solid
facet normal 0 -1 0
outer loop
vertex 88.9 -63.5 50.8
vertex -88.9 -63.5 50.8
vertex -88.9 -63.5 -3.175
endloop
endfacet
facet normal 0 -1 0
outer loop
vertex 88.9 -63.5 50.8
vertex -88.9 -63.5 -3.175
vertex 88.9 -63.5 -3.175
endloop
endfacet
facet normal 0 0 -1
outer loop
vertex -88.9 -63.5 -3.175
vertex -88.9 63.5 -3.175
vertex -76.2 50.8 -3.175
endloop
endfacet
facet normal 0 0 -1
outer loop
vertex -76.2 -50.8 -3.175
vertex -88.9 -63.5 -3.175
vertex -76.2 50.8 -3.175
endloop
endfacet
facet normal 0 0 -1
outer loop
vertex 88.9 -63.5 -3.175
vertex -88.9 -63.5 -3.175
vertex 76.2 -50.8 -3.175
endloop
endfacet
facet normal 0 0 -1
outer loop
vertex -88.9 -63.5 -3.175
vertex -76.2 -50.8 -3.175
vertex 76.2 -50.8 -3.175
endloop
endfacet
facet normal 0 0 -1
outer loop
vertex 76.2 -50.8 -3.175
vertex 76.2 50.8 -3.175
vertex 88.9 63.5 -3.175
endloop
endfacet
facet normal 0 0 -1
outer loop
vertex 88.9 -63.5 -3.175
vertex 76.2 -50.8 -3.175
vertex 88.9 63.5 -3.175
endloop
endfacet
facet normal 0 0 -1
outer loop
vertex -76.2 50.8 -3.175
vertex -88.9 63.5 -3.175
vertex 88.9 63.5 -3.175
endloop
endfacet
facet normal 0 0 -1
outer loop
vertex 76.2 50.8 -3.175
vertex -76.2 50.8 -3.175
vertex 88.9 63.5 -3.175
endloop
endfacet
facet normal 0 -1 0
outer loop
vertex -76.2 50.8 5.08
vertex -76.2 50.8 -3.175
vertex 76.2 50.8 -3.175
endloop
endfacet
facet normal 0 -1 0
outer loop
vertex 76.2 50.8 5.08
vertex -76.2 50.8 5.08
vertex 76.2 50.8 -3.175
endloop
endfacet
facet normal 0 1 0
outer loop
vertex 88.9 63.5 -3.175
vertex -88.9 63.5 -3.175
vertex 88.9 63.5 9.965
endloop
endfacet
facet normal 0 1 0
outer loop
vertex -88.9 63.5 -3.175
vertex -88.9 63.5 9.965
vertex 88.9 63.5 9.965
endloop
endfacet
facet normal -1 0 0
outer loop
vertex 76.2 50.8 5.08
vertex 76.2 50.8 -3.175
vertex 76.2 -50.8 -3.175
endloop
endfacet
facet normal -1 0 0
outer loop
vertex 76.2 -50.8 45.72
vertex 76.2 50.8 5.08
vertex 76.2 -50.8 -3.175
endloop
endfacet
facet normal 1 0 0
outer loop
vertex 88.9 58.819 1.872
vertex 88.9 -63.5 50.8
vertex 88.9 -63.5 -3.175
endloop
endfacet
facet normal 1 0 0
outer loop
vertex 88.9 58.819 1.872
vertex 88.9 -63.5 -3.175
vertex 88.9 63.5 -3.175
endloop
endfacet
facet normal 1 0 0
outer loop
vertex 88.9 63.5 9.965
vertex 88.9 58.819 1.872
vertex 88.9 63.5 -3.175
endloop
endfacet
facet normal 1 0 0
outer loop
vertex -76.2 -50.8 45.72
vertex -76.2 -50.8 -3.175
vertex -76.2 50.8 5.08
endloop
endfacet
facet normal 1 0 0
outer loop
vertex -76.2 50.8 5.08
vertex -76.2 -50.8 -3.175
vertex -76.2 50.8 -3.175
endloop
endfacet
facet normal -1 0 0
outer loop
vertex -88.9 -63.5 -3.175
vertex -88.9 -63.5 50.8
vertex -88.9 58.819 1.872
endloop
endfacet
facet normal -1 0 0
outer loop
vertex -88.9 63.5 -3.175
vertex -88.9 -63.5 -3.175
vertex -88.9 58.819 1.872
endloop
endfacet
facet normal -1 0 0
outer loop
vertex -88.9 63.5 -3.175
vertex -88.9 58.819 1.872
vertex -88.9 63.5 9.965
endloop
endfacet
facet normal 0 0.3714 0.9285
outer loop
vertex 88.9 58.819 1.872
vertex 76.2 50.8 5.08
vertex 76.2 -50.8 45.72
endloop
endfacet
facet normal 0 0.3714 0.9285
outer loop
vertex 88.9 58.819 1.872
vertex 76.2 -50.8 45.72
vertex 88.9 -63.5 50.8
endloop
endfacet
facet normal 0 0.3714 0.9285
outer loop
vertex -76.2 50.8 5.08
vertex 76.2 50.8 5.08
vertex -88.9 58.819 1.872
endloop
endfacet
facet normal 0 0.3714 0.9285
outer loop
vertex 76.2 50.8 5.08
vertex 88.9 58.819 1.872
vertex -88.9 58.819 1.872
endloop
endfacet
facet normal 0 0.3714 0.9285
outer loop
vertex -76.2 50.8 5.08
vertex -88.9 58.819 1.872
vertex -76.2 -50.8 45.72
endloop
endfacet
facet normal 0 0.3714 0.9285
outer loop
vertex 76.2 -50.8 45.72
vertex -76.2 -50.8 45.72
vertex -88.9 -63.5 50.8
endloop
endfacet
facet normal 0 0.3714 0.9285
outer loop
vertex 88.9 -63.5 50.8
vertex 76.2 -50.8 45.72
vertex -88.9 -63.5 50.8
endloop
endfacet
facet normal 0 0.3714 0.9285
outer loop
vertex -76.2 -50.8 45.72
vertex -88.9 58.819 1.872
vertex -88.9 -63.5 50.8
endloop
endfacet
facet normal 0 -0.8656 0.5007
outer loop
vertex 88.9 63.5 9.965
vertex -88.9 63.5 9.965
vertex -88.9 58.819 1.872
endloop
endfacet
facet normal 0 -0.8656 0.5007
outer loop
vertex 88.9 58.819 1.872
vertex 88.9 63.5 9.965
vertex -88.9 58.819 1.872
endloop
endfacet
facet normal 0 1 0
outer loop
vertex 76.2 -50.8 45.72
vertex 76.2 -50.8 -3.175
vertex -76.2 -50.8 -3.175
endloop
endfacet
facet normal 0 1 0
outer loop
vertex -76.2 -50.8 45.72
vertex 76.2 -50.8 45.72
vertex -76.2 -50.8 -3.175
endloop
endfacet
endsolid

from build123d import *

# Parameters (mm, degrees)
F0_W     = 177.8
F0_H     = 127
F1_DEPTH = 50.8
F3_DEPTH = 2514.6
F4_DEPTH = 3.175
F6_DEPTH = 2514.6


with BuildPart() as f1:
    # F0 (on Top) → F1 (new body)
    with BuildSketch(Plane.XY):
        Rectangle(F0_W, F0_H)
    extrude(amount=F1_DEPTH)

    # F2 (on face) → F3 (cut)
    with BuildSketch(Plane(origin=(-88.9, 0, 0), x_dir=(0, -1, 0), z_dir=(-1, 0, 0))):
        Polygon((-63.5, 9.9646151066), (-58.8191700766, 1.8723319694), (63.5, 50.8), (-63.5, 50.8), align=None)
    extrude(amount=-F3_DEPTH, mode=Mode.SUBTRACT)

    # F4 (add): a face of the model
    f4_faces = [f1.faces().sort_by_distance(p)[0] for p in [
        (0, 0, 0),
    ]]
    extrude(f4_faces, amount=F4_DEPTH)

    # F5 (on face) → F6 (cut)
    with BuildSketch(Plane(origin=(0, 0, -3.175), x_dir=(1, 0, 0), z_dir=(0, 0, -1))):
        Polygon((-76.2, -50.8), (76.2, -50.8), (76.2, 0), (76.2, 50.8), (0, 50.8), (-76.2, 50.8), align=None)
    extrude(amount=-F6_DEPTH, mode=Mode.SUBTRACT)


solid = f1.part
